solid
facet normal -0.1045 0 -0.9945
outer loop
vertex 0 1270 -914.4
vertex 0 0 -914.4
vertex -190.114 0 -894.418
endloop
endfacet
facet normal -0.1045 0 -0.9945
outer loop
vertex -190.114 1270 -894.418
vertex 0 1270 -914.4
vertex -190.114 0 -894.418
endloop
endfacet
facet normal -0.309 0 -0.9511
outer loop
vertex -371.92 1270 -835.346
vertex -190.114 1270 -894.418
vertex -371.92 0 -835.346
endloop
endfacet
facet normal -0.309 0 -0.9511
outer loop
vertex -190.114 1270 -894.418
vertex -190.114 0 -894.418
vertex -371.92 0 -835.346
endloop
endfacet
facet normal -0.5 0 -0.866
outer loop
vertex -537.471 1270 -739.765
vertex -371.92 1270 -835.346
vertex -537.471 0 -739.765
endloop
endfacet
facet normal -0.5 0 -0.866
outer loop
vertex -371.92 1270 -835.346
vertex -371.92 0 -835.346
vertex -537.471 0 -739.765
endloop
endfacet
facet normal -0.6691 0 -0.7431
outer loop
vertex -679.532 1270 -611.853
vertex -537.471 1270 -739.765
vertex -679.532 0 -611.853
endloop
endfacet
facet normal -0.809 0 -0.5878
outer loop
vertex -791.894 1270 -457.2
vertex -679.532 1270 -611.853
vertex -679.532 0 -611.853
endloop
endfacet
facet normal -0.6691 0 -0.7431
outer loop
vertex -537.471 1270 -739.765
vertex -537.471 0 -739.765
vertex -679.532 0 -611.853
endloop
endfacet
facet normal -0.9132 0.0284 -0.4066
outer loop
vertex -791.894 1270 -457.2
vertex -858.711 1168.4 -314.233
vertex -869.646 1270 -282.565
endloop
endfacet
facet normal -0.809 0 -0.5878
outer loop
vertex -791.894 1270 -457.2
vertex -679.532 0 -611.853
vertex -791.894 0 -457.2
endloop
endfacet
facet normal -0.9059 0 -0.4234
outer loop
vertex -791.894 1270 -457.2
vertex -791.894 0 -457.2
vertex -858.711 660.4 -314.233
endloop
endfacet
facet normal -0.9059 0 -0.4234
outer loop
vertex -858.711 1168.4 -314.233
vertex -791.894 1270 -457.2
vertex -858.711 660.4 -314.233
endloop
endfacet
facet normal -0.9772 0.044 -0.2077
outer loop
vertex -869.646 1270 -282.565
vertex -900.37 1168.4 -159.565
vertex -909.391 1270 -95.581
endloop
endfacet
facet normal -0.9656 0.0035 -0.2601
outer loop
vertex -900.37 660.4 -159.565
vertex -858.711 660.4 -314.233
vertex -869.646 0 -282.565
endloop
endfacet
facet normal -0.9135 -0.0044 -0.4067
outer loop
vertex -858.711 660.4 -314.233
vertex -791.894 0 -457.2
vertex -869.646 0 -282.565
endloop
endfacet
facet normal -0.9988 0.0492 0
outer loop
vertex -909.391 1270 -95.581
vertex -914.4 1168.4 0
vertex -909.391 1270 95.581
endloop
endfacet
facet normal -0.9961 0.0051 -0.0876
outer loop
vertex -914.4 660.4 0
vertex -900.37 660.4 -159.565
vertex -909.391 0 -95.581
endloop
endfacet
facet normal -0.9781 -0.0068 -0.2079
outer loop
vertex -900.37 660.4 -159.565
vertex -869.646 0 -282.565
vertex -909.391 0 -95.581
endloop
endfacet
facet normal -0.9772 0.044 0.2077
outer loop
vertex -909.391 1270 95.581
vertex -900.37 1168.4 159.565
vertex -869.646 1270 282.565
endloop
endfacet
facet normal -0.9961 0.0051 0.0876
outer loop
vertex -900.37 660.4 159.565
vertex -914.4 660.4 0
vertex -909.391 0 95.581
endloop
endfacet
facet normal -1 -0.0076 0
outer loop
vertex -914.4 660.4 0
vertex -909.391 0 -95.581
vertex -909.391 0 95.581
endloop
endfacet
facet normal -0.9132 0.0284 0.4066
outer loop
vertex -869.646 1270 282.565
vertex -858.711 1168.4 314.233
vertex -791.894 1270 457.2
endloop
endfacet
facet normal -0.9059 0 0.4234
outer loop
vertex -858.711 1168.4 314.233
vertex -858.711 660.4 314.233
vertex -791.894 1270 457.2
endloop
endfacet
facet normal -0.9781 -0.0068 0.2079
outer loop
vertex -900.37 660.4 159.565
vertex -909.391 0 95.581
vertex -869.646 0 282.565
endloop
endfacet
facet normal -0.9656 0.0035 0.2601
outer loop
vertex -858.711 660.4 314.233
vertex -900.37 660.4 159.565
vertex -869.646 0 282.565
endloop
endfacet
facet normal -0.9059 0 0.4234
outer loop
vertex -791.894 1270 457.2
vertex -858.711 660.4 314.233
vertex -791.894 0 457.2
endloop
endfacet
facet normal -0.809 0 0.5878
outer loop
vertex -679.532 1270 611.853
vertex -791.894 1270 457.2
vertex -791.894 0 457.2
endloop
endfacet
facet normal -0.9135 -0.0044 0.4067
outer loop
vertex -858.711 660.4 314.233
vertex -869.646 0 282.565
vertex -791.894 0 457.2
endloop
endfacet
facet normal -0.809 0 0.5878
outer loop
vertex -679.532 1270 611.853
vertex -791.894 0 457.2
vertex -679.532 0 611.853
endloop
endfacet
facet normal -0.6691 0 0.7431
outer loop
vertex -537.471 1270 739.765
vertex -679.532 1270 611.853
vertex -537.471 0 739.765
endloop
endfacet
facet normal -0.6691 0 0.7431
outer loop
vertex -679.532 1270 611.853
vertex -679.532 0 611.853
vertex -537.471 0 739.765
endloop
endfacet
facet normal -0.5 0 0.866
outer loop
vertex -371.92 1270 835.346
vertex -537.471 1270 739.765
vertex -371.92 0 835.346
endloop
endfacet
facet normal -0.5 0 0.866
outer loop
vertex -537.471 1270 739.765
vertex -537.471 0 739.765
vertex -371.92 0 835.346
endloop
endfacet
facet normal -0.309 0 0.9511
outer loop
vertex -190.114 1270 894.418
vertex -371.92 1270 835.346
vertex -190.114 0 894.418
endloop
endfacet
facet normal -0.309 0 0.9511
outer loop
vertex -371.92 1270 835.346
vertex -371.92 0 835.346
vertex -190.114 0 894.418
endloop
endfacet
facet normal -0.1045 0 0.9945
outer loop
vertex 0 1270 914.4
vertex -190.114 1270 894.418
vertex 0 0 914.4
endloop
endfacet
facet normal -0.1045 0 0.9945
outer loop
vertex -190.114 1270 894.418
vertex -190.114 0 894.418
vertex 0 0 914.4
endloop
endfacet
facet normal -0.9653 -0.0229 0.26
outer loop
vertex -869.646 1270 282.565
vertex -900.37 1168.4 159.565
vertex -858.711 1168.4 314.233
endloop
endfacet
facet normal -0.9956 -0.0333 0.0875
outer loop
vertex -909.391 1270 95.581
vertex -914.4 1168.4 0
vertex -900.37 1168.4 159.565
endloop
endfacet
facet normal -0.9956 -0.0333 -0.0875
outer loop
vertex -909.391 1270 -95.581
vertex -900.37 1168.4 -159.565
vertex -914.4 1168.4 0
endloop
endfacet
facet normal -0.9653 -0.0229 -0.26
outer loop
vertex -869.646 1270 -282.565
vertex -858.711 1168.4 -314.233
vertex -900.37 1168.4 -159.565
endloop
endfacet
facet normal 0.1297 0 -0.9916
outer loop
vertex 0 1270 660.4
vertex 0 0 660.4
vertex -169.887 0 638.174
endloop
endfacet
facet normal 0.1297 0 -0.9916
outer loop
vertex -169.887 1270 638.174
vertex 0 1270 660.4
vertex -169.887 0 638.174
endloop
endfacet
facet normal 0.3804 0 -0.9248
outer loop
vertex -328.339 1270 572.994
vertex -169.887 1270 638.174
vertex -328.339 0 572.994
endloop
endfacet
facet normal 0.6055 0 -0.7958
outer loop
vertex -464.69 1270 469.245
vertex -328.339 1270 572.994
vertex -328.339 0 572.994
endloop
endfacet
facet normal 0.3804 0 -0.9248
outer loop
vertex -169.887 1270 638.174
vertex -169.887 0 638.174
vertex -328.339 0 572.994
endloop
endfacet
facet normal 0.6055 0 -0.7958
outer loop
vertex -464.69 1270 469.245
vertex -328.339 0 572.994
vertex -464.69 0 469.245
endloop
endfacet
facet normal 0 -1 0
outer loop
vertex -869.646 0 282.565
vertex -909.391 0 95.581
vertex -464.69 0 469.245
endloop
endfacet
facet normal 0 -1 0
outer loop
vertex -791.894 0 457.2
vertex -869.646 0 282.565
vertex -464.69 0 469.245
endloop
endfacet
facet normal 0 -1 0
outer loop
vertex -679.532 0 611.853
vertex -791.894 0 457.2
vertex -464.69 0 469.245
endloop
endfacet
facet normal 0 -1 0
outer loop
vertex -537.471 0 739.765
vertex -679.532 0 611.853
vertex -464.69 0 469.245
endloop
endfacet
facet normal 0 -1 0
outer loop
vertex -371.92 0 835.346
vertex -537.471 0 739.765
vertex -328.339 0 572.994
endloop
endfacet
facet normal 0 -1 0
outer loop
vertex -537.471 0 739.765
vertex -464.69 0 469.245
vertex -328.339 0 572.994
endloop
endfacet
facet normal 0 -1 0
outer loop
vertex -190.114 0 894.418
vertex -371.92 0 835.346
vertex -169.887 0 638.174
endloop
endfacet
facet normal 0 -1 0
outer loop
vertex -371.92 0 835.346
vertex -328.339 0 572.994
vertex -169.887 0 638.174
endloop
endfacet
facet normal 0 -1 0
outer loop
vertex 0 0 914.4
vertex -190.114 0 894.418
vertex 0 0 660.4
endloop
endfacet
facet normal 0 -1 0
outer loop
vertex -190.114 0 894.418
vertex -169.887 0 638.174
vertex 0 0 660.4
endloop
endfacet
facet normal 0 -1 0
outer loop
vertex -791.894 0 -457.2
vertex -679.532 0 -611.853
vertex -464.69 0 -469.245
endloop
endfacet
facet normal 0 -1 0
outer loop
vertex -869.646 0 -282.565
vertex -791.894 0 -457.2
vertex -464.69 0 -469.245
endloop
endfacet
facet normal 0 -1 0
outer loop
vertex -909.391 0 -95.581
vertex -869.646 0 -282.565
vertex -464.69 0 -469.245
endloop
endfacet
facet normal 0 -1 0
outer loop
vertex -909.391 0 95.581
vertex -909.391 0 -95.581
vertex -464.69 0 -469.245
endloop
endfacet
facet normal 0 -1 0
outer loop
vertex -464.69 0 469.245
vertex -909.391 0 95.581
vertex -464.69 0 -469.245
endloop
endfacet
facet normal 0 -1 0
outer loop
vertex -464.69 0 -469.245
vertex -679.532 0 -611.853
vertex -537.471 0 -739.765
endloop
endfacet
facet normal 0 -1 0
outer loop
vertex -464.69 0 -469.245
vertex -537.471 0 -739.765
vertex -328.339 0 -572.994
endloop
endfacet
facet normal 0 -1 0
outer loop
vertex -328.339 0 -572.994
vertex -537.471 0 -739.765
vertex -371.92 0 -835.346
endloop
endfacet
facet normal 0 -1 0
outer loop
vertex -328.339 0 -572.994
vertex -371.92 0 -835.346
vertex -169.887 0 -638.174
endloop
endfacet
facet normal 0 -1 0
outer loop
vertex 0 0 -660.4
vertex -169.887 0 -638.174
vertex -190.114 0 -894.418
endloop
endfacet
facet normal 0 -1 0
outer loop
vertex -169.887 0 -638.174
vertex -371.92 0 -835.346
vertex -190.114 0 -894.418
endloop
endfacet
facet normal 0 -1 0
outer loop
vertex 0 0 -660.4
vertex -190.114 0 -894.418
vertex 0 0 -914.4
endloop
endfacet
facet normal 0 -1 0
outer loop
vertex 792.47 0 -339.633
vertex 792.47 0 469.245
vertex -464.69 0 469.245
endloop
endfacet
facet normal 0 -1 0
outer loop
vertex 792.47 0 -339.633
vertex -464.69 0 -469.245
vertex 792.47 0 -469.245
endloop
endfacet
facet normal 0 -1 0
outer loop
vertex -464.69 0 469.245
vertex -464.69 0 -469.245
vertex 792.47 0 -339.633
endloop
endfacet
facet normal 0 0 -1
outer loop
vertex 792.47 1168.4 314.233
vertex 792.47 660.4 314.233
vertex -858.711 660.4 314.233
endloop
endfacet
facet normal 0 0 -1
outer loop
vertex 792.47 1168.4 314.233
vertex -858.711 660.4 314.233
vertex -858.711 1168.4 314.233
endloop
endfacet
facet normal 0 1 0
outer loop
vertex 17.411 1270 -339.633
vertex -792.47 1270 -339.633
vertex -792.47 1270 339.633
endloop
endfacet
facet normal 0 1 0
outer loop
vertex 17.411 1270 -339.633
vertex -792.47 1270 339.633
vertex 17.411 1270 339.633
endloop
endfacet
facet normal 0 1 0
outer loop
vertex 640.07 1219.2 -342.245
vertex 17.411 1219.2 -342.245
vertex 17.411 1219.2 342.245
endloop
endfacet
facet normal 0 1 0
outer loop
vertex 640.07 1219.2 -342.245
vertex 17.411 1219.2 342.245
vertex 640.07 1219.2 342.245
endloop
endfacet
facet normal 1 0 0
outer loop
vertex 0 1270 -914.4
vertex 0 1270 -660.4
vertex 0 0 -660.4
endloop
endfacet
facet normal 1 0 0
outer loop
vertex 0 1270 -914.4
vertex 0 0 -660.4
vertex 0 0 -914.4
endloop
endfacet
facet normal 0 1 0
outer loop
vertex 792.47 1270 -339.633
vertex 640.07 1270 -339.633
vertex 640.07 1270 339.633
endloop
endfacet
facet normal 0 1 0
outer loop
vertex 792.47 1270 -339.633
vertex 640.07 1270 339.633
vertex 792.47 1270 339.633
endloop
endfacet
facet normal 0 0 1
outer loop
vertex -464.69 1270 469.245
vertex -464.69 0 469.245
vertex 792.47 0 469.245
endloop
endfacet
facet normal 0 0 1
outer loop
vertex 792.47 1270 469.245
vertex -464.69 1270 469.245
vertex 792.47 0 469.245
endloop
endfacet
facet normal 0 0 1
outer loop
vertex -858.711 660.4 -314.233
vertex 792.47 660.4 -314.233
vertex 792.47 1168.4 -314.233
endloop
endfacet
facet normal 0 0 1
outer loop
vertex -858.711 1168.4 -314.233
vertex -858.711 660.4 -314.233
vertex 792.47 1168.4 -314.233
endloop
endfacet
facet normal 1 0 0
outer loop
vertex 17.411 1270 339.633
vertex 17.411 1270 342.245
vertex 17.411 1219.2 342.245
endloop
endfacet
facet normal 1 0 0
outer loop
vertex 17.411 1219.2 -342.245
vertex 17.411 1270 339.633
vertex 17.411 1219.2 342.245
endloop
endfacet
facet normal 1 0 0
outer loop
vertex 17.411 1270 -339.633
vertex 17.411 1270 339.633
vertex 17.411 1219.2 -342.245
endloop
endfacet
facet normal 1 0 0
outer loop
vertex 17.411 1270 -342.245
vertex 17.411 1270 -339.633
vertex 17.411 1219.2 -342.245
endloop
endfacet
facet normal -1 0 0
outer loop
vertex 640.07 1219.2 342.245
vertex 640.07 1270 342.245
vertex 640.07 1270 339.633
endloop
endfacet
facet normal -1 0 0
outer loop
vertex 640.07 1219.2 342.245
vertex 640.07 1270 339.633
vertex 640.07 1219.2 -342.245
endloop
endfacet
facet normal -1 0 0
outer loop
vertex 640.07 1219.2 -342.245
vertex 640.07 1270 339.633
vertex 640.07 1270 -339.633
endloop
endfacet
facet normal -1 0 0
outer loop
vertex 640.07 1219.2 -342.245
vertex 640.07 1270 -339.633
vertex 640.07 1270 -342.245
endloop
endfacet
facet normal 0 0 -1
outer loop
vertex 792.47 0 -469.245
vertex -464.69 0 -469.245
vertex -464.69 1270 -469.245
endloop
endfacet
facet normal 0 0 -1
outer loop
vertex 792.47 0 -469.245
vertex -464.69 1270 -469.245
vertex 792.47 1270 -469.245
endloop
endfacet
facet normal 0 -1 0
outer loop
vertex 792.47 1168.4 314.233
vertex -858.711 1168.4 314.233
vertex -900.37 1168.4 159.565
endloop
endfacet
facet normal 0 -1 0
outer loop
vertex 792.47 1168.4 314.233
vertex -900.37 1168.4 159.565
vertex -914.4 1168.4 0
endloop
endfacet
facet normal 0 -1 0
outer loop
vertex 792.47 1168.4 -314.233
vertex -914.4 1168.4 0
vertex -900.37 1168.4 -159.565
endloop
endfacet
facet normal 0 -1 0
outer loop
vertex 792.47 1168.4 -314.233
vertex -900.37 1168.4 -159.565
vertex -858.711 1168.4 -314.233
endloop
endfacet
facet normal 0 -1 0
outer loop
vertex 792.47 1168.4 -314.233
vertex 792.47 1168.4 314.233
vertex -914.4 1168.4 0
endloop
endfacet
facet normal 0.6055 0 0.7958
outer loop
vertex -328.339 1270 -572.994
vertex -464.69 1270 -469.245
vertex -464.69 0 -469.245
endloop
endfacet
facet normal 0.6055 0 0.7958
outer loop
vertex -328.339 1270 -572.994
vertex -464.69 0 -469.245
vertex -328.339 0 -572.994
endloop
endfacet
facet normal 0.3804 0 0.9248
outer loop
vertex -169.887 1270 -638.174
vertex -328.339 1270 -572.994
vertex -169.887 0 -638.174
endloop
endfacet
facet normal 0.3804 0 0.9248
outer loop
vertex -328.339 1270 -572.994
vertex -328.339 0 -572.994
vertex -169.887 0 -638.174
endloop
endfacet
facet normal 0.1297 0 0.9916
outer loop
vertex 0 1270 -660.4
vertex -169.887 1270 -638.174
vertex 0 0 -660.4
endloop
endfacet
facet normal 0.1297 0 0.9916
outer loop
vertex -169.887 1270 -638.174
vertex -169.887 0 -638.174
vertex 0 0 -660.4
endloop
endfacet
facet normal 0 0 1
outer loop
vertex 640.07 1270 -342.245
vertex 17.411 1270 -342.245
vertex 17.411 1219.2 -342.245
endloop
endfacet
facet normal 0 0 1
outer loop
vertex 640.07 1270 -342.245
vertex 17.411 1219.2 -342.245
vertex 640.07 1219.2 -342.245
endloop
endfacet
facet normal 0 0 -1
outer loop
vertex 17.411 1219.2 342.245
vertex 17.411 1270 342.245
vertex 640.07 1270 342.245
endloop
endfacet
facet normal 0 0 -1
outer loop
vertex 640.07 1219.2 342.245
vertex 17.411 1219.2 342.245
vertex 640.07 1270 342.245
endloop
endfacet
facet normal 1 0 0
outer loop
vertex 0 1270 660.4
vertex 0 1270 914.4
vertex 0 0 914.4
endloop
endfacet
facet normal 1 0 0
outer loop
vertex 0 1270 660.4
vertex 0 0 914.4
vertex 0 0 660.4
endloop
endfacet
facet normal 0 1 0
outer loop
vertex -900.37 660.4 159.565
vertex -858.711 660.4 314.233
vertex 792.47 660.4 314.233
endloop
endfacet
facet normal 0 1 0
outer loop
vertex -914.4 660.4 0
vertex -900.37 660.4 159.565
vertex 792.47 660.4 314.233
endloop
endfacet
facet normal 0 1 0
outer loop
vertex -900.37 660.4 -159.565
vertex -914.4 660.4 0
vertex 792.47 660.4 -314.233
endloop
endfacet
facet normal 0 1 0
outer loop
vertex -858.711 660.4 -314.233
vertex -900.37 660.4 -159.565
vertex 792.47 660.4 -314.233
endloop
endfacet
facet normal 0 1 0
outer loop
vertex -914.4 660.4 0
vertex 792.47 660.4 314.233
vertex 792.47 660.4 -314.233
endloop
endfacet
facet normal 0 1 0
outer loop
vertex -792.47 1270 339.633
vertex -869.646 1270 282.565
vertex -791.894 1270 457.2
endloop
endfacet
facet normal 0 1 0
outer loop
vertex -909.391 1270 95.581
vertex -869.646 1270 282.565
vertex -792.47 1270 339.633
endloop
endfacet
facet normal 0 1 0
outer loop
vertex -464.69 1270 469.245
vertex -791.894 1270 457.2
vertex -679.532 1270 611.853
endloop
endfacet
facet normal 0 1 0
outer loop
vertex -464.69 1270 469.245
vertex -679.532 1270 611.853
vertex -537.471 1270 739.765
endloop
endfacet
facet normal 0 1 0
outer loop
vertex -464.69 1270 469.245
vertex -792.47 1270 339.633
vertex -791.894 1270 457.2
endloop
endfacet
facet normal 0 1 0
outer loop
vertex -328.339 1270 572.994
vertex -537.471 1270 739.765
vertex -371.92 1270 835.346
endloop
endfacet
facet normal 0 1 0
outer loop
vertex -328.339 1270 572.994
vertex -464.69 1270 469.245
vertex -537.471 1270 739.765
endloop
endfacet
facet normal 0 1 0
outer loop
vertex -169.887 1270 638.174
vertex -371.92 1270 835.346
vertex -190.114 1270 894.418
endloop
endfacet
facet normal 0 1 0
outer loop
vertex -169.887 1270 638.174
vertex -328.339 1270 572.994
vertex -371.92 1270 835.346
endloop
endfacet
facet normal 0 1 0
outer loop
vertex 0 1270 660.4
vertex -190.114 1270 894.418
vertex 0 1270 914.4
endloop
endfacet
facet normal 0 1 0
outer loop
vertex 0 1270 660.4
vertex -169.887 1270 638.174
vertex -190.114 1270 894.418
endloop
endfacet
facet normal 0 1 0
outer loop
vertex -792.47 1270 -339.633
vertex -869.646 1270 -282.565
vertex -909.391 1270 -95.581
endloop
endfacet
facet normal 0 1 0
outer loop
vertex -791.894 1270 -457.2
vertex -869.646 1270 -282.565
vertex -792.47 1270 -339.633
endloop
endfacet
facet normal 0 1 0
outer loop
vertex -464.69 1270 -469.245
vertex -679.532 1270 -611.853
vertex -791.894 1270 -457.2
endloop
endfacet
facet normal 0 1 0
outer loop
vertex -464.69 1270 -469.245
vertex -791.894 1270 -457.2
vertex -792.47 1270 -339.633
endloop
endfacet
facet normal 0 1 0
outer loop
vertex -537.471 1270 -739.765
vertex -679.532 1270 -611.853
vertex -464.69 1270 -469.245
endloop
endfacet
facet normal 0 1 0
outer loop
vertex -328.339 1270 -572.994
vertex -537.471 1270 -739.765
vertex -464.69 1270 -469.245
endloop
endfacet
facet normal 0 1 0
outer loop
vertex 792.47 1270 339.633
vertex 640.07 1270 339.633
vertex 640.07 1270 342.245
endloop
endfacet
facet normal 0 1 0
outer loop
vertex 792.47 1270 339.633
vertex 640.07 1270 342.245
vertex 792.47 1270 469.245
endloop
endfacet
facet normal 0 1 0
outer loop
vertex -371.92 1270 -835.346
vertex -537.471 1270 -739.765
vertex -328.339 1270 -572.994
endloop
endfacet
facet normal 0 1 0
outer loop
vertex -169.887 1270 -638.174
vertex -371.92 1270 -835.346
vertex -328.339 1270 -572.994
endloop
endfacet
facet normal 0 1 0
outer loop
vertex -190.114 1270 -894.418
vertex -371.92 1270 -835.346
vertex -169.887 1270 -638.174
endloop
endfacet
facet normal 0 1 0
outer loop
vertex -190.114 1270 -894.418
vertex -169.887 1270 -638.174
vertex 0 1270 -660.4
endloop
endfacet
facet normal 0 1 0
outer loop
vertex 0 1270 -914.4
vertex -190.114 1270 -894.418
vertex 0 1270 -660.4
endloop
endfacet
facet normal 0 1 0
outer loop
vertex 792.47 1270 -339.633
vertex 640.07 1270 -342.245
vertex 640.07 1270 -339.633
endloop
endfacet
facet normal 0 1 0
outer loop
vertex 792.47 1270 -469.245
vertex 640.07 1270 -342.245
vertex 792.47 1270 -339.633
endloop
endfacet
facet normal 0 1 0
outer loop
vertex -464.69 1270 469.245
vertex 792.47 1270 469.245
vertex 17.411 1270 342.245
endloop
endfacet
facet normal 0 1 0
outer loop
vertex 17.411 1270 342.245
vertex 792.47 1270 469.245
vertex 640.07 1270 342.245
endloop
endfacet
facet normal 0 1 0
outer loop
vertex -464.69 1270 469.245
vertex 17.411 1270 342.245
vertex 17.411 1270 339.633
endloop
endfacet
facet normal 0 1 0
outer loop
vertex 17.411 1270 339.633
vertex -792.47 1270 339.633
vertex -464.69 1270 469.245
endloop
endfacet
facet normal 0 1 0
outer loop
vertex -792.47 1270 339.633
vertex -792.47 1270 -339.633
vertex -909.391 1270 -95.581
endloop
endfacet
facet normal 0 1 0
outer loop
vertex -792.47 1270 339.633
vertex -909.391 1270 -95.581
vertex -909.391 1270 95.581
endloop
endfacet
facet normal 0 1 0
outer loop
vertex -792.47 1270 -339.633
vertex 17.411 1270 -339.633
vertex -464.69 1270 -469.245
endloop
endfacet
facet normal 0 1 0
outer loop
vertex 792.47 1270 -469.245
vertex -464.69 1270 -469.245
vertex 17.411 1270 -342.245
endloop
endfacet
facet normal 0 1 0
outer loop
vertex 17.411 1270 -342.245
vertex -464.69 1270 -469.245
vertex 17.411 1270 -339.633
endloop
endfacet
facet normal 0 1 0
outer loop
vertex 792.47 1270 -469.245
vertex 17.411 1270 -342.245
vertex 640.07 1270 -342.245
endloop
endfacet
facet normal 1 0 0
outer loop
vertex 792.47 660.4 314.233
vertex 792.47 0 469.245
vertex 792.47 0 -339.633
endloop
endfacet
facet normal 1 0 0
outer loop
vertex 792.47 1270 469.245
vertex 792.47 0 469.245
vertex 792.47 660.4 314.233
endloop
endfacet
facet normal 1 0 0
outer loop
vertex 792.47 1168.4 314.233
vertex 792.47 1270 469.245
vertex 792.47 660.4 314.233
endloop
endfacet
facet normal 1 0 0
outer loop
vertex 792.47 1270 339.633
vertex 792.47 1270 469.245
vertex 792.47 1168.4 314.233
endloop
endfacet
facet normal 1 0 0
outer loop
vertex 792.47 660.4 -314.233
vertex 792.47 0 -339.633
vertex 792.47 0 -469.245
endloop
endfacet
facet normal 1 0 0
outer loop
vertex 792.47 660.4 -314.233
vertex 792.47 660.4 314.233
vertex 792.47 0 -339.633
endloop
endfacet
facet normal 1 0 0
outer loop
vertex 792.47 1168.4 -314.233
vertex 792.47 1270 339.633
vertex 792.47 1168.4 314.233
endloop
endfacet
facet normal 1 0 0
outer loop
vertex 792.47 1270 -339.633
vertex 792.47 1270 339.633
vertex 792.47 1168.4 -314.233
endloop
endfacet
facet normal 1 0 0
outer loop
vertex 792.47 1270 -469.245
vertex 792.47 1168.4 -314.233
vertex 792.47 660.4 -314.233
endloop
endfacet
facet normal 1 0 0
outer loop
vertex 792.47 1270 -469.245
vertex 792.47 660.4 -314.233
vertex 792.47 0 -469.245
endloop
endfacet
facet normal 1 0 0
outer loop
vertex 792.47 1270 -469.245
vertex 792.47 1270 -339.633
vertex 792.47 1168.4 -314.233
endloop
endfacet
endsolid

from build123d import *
from OCP.BRepAlgoAPI import BRepAlgoAPI_Cut
from OCP.TopTools import TopTools_ListOfShape

# Parameters (mm, degrees)
EXTRUDE_1_DEPTH     = 1270
SKETCH_5_W          = 72.235282366
SKETCH_5_H          = 338.817872049
EXTRUDE_1_2_DEPTH   = 1270
SKETCH_9_W          = 66.439449902
SKETCH_9_H          = 119.69450016
EXTRUDE_2_DEPTH     = 1270
SKETCH_779_W        = 1584.940783878
SKETCH_779_H        = 679.265773974
EXTRUDE_7_DEPTH     = 1270.000001702
SKETCH_15_W         = 628.465773974
SKETCH_15_H         = 508
CUT_EXTRUDE_1_DEPTH = 5080
SKETCH_16_W         = 1396.738419433
SKETCH_16_H         = 129.612550511
EXTRUDE_8_DEPTH     = 1270
SKETCH_17_W         = 1408.739581517
SKETCH_17_H         = 129.612550511
EXTRUDE_9_DEPTH     = 1270
SKETCH_20_W         = 622.659597216
SKETCH_20_H         = 684.490874996
CUT_EXTRUDE_2_DEPTH = 50.8


with BuildPart() as part:
    # 草圖1 → Extrude 1 (new body)
    with BuildSketch(Plane(origin=(0, 0, 0), x_dir=(1, 0, 0), z_dir=(0, 1, 0))):
        with BuildLine():
            ThreePointArc((0, 914.4), (-914.4, 0), (0, -914.4))
            Line((0, -914.4), (0, -660.4))
            ThreePointArc((0, -660.4), (-660.4, 0), (0, 660.4))
            Line((0, 660.4), (0, 914.4))
        make_face()
    extrude(amount=EXTRUDE_1_DEPTH)

    # 草圖5 → Extrude 1 2 (add, through all)
    with BuildSketch(Plane(origin=(0, 1270, 0), x_dir=(1, 0, 0), z_dir=(0, 1, 0))):
        with Locations((-828.280286412, 6.324353143)):
            Rectangle(SKETCH_5_W, SKETCH_5_H)
    extrude(amount=-EXTRUDE_1_2_DEPTH)

    # 草圖9 → 填補2 (add, through all)
    with BuildSketch(Plane(origin=(0, 1270, 0), x_dir=(1, 0, 0), z_dir=(0, 1, 0))):
        with Locations((-825.38237018, -198.335355397)):
            Rectangle(SKETCH_9_W, SKETCH_9_H)
    extrude(amount=-EXTRUDE_2_DEPTH)

    # Sketch 779 → 填料-伸長7 (add)
    with BuildSketch(Plane(origin=(0, 0, 0), x_dir=(1, 0, 0), z_dir=(0, 1, 0))):
        Rectangle(SKETCH_779_W, SKETCH_779_H)
    extrude(amount=EXTRUDE_7_DEPTH)

    # 草圖15 → 除料-伸長1 (cut)
    with BuildSketch(Plane(origin=(792.470391939, 0, 0), x_dir=(0, 0, -1), z_dir=(1, 0, 0))):
        with Locations((0, 914.400001702)):
            Rectangle(SKETCH_15_W, SKETCH_15_H)
    extrude(amount=-CUT_EXTRUDE_1_DEPTH, mode=Mode.SUBTRACT)

    # 草圖16 → 填料-伸長8 (add, through all)
    with BuildSketch(Plane(origin=(0, 1270, 0), x_dir=(1, 0, 0), z_dir=(0, 1, 0))):
        with Locations((94.101182222, -404.439162243)):
            Rectangle(SKETCH_16_W, SKETCH_16_H)
    extrude(amount=-EXTRUDE_8_DEPTH)

    # 草圖17 → 填料-伸長9 (add, through all)
    with BuildSketch(Plane(origin=(0, 1270, 0), x_dir=(1, 0, 0), z_dir=(0, 1, 0))):
        with Locations((88.100601181, 404.439162243)):
            Rectangle(SKETCH_17_W, SKETCH_17_H)
    extrude(amount=-EXTRUDE_9_DEPTH)


with BuildPart() as cut_extrude_2_tool:
    # 草圖20 → 除料-伸長2 (new body)
    with BuildSketch(Plane(origin=(0, 1270, 0), x_dir=(1, 0, 0), z_dir=(0, 1, 0))):
        with Locations((328.740593331, 0)):
            Rectangle(SKETCH_20_W, SKETCH_20_H)
    extrude(amount=-CUT_EXTRUDE_2_DEPTH)


with BuildPart() as part_1:
    add(part.part)

    # 除料-伸長2: cut by cut_extrude_2_tool, with a tolerance
    cut_extrude_2_stock = TopTools_ListOfShape()
    cut_extrude_2_stock.Append(part_1.part.wrapped)
    cut_extrude_2_tools = TopTools_ListOfShape()
    cut_extrude_2_tools.Append(cut_extrude_2_tool.part.wrapped)
    cut_extrude_2_cut = BRepAlgoAPI_Cut()
    cut_extrude_2_cut.SetArguments(cut_extrude_2_stock)
    cut_extrude_2_cut.SetTools(cut_extrude_2_tools)
    cut_extrude_2_cut.SetFuzzyValue(0.00001)
    cut_extrude_2_cut.Build()
    add(Compound.cast(cut_extrude_2_cut.Shape()).solids(), mode=Mode.REPLACE)


solid = part_1.part
